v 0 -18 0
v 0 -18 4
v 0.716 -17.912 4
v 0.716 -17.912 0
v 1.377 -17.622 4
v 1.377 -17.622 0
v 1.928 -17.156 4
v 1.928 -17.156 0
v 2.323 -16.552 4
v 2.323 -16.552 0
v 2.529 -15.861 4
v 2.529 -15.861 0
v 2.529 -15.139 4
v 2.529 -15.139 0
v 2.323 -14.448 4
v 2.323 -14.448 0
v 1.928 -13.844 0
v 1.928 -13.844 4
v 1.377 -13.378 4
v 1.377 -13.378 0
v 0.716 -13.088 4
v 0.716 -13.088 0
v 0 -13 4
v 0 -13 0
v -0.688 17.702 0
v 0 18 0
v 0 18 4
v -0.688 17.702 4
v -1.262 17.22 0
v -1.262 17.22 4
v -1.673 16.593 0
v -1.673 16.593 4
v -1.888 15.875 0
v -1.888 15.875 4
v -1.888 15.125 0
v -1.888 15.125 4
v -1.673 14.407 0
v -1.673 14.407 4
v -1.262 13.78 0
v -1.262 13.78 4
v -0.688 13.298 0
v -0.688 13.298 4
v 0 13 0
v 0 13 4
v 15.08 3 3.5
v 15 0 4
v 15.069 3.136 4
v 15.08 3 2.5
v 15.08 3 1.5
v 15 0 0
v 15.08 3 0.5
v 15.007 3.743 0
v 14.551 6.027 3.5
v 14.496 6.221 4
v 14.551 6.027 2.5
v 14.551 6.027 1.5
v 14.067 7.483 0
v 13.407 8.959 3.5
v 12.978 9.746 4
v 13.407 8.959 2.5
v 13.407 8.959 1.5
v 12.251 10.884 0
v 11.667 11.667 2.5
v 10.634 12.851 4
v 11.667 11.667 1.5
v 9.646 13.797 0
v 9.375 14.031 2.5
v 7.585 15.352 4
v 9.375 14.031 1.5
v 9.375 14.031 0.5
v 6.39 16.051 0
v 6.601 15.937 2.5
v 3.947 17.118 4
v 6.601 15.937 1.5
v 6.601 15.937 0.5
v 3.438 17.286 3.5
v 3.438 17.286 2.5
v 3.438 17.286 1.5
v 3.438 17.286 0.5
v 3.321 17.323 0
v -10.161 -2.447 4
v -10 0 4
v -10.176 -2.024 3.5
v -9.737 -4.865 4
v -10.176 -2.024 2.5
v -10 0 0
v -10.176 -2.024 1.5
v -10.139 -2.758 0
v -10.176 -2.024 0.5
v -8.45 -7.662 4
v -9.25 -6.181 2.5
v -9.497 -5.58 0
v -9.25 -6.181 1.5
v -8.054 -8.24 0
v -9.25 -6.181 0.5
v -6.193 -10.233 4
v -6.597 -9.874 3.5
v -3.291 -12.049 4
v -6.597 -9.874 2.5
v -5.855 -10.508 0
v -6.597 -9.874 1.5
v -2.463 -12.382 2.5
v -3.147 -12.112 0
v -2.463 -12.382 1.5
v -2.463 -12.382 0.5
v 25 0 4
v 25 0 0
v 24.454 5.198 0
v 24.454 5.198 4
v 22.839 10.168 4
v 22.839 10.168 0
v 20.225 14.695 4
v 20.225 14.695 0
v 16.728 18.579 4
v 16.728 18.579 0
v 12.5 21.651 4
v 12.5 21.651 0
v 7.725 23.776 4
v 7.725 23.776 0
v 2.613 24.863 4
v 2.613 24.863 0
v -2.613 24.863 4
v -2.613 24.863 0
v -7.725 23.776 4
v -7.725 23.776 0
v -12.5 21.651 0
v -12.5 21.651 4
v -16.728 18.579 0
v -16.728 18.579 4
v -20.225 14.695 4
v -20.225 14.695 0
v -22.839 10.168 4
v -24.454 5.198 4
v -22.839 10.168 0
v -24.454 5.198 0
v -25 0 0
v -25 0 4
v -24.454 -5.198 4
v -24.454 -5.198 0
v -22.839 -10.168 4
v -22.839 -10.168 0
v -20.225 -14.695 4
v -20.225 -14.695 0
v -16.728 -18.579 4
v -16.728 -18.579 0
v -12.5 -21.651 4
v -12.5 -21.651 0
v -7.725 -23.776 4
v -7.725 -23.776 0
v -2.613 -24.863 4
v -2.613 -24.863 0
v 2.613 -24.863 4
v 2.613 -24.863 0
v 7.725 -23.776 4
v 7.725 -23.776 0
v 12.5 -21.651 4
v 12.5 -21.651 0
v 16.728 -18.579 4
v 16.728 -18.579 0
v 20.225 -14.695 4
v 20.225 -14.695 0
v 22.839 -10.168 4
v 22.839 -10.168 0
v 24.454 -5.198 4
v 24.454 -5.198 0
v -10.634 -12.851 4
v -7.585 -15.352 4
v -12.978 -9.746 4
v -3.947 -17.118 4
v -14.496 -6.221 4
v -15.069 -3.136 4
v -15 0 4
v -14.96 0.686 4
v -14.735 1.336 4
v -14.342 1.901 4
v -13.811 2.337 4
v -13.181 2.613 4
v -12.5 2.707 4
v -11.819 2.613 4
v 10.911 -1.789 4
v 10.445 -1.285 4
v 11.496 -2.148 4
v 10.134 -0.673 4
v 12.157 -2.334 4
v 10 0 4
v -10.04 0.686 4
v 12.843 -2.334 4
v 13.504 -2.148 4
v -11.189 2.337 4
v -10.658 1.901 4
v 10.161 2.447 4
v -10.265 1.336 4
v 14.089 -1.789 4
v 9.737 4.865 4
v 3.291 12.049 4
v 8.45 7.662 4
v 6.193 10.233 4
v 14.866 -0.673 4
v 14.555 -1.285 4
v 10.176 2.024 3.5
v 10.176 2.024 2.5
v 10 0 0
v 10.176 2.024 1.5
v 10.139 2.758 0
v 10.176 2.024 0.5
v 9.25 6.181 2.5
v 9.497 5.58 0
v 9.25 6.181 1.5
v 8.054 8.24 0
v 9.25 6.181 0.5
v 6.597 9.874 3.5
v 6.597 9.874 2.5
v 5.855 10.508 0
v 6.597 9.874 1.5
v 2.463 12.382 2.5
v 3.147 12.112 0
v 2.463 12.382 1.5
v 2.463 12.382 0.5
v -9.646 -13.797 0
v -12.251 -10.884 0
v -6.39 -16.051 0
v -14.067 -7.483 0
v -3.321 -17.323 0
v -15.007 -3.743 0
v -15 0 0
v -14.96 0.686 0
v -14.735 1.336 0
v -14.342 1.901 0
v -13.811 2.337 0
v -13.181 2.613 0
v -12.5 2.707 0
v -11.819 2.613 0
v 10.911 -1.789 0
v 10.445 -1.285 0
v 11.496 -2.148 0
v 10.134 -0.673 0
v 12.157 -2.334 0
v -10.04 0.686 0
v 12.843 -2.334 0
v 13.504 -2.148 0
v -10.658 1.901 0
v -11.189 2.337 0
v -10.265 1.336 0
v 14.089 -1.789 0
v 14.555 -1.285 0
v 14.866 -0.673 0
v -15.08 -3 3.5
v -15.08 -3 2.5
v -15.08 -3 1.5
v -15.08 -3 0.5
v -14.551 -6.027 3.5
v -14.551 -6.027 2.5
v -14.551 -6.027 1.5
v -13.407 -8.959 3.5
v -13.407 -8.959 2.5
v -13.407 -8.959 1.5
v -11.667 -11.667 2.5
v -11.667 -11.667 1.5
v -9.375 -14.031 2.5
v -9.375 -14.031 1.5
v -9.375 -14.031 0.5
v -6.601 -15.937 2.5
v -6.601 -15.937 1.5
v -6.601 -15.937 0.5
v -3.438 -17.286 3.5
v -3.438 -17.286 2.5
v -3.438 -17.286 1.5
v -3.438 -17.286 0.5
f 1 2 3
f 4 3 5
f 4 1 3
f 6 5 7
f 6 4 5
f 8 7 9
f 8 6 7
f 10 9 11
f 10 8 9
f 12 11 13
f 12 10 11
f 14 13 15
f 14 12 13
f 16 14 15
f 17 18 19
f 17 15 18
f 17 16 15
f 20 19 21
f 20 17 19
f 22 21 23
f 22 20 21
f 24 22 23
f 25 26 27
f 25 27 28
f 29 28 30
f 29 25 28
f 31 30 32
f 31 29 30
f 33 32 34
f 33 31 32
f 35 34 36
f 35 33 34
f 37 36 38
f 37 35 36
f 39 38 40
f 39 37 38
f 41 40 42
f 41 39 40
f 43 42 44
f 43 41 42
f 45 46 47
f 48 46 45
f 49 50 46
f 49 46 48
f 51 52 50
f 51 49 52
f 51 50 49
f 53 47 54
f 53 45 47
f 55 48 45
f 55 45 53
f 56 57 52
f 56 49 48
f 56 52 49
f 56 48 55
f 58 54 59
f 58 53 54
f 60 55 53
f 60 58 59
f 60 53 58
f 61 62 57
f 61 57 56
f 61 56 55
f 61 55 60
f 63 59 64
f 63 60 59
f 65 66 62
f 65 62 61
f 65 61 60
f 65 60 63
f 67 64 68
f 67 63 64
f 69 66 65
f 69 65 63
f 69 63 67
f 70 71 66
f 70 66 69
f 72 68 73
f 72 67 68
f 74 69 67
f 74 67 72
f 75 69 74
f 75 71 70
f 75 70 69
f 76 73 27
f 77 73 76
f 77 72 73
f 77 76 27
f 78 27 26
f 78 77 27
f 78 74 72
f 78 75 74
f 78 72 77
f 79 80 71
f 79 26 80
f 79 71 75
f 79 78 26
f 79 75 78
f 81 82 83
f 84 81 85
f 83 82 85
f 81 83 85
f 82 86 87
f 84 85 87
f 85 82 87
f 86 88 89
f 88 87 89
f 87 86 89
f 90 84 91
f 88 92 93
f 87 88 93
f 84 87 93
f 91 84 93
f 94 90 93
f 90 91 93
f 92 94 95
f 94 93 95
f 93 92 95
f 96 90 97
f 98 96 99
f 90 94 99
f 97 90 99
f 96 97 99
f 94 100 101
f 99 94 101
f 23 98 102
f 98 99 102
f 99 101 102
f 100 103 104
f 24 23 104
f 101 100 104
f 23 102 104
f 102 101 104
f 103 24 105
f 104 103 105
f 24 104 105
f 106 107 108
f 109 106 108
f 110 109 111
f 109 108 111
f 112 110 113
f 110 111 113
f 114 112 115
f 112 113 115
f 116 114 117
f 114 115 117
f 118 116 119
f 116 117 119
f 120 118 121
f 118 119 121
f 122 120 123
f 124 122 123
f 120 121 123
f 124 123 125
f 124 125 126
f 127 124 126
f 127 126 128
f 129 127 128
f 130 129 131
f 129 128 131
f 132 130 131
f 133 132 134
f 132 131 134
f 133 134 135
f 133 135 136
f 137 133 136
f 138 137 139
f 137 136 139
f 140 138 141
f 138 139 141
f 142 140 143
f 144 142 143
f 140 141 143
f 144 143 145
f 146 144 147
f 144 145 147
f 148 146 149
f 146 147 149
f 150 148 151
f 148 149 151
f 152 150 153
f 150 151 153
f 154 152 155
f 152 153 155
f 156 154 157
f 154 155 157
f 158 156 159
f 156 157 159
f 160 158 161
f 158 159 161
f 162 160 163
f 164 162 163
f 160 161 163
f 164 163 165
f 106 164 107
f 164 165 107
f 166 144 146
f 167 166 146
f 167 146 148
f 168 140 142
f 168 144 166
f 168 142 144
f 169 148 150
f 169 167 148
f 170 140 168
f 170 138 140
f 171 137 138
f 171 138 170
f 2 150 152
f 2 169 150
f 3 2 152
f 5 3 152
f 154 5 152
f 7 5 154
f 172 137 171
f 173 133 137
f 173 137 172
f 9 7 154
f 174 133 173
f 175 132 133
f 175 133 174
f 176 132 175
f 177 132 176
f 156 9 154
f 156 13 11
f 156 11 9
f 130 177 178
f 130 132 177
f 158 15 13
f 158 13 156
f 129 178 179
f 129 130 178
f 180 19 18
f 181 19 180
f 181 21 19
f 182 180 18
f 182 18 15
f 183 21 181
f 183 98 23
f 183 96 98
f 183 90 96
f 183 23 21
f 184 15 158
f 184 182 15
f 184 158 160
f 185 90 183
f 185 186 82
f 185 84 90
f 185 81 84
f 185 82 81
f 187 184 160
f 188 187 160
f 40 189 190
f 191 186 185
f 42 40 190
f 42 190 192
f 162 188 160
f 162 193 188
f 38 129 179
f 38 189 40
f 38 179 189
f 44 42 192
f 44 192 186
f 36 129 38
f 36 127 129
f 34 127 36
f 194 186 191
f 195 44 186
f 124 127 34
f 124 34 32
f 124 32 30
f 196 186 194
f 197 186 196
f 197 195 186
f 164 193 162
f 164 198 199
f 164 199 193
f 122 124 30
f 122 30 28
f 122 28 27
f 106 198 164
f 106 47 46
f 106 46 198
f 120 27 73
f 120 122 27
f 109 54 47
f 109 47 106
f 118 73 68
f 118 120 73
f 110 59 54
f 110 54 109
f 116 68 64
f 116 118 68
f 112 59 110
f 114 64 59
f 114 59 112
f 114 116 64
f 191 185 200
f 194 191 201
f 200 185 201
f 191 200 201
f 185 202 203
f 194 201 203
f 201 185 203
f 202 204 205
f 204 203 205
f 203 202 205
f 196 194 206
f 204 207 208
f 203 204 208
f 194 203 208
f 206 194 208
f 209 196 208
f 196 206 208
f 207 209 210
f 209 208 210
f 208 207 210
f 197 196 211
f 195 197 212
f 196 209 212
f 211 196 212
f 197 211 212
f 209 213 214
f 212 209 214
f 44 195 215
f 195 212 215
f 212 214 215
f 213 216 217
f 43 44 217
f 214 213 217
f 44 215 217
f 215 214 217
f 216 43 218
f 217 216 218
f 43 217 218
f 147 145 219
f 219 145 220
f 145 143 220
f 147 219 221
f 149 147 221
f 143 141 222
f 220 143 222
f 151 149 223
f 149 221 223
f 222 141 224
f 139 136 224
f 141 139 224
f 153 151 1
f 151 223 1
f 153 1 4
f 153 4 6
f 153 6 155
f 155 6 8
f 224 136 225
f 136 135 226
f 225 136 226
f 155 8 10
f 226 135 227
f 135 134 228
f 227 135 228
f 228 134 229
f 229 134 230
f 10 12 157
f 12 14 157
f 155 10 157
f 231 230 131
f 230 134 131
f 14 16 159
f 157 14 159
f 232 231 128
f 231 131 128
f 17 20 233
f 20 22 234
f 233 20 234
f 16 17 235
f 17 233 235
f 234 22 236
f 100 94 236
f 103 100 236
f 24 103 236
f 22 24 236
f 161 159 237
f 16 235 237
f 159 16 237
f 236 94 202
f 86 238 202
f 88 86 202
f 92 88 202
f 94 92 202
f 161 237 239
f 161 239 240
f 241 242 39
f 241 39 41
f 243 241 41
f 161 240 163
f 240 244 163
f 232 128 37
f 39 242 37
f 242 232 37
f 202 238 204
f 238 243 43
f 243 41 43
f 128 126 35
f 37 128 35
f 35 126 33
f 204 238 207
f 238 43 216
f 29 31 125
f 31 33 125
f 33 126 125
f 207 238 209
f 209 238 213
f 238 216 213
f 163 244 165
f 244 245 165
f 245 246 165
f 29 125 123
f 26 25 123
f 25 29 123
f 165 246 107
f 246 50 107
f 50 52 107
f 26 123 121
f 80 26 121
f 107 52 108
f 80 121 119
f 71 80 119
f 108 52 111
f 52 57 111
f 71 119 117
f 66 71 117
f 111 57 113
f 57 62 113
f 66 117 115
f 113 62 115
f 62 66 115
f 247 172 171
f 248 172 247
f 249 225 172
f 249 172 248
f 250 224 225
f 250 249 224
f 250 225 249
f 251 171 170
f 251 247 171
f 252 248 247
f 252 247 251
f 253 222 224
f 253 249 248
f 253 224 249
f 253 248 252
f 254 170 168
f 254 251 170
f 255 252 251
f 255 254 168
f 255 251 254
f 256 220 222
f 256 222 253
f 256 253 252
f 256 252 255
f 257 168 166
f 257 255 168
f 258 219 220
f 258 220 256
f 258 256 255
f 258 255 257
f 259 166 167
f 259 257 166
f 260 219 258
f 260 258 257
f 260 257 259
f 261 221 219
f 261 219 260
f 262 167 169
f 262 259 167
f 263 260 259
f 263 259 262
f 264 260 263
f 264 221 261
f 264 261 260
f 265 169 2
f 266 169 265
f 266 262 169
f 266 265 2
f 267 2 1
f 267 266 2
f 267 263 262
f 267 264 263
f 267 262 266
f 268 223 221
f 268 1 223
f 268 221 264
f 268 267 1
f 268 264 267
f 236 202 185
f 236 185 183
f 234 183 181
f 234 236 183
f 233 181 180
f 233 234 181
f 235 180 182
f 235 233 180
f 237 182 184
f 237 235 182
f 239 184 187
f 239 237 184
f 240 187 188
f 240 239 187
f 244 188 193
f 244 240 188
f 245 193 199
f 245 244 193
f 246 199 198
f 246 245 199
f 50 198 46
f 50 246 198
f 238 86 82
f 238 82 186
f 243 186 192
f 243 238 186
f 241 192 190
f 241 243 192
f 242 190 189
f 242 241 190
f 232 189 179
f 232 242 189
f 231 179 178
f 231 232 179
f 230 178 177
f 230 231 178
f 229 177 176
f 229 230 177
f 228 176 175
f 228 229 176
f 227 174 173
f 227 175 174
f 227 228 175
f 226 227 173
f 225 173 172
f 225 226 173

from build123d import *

# Parameters (mm, degrees)
SKETCH_R        = 25
PAD_DEPTH       = 4
POCKET_DEPTH    = 5
POCKET001_DEPTH = 5


with BuildPart() as part:
    # Sketch → Pad (new body)
    with BuildSketch(Plane.XY):
        Circle(SKETCH_R)
    extrude(amount=PAD_DEPTH)

    # Sketch003 → Pocket (cut)
    with BuildSketch(Plane(origin=(0, 0, 0), x_dir=(-1, 0, 0), z_dir=(0, 0, 1))):
        with BuildLine():
            ThreePointArc((-10, 0), (-12.5, 2.357995), (-15, 0))
            add(Edge.make_bspline(
                [(-15, 0), (-15.375, -2.945243), (-15.089089, -6.058788), (-14.076175, -9.167592), (-12.324531, -12.071008), (-9.890344, -14.561821), (-6.900284, -16.456905), (-3.534292, -17.625), (0, -18)],
                knots=[0, 0, 0, 0, 0, 0, 0, 0, 0, 1.862096, 1.862096, 1.862096, 1.862096, 1.862096, 1.862096, 1.862096, 1.862096, 1.862096], degree=8))
            ThreePointArc((0, -18), (1.91492, -15.5), (0, -13))
            add(Edge.make_bspline(
                [(-10, 0), (-10.375, -1.963495), (-10.309393, -4.095292), (-9.737085, -6.280026), (-8.628237, -8.374714), (-7.002778, -10.222731), (-4.936788, -11.677209), (-2.552544, -12.625), (0, -13)],
                knots=[0, 0, 0, 0, 0, 0, 0, 0, 0, 1.862096, 1.862096, 1.862096, 1.862096, 1.862096, 1.862096, 1.862096, 1.862096, 1.862096], degree=8))
        make_face()
    extrude(amount=POCKET_DEPTH, mode=Mode.SUBTRACT)

    # Sketch005 → Pocket001 (cut)
    with BuildSketch(Plane(origin=(0, 0, 0), x_dir=(-1, 0, 0), z_dir=(0, 0, 1))):
        with BuildLine():
            ThreePointArc((10, 0), (12.5, -2.707209), (15, 0))
            add(Edge.make_bspline(
                [(15, 0), (15.375, 2.945243), (15.089089, 6.058788), (14.076175, 9.167592), (12.324531, 12.071008), (9.890344, 14.561821), (6.900284, 16.456905), (3.534292, 17.625), (0, 18)],
                knots=[0, 0, 0, 0, 0, 0, 0, 0, 0, 1.862096, 1.862096, 1.862096, 1.862096, 1.862096, 1.862096, 1.862096, 1.862096, 1.862096], degree=8))
            ThreePointArc((0, 18), (-2.555164, 15.5), (0, 13))
            add(Edge.make_bspline(
                [(10, 0), (10.375, 1.963495), (10.309393, 4.095292), (9.737085, 6.280026), (8.628237, 8.374714), (7.002778, 10.222731), (4.936788, 11.677209), (2.552544, 12.625), (0, 13)],
                knots=[0, 0, 0, 0, 0, 0, 0, 0, 0, 1.862096, 1.862096, 1.862096, 1.862096, 1.862096, 1.862096, 1.862096, 1.862096, 1.862096], degree=8))
        make_face()
    extrude(amount=POCKET001_DEPTH, mode=Mode.SUBTRACT)


solid = part.part
